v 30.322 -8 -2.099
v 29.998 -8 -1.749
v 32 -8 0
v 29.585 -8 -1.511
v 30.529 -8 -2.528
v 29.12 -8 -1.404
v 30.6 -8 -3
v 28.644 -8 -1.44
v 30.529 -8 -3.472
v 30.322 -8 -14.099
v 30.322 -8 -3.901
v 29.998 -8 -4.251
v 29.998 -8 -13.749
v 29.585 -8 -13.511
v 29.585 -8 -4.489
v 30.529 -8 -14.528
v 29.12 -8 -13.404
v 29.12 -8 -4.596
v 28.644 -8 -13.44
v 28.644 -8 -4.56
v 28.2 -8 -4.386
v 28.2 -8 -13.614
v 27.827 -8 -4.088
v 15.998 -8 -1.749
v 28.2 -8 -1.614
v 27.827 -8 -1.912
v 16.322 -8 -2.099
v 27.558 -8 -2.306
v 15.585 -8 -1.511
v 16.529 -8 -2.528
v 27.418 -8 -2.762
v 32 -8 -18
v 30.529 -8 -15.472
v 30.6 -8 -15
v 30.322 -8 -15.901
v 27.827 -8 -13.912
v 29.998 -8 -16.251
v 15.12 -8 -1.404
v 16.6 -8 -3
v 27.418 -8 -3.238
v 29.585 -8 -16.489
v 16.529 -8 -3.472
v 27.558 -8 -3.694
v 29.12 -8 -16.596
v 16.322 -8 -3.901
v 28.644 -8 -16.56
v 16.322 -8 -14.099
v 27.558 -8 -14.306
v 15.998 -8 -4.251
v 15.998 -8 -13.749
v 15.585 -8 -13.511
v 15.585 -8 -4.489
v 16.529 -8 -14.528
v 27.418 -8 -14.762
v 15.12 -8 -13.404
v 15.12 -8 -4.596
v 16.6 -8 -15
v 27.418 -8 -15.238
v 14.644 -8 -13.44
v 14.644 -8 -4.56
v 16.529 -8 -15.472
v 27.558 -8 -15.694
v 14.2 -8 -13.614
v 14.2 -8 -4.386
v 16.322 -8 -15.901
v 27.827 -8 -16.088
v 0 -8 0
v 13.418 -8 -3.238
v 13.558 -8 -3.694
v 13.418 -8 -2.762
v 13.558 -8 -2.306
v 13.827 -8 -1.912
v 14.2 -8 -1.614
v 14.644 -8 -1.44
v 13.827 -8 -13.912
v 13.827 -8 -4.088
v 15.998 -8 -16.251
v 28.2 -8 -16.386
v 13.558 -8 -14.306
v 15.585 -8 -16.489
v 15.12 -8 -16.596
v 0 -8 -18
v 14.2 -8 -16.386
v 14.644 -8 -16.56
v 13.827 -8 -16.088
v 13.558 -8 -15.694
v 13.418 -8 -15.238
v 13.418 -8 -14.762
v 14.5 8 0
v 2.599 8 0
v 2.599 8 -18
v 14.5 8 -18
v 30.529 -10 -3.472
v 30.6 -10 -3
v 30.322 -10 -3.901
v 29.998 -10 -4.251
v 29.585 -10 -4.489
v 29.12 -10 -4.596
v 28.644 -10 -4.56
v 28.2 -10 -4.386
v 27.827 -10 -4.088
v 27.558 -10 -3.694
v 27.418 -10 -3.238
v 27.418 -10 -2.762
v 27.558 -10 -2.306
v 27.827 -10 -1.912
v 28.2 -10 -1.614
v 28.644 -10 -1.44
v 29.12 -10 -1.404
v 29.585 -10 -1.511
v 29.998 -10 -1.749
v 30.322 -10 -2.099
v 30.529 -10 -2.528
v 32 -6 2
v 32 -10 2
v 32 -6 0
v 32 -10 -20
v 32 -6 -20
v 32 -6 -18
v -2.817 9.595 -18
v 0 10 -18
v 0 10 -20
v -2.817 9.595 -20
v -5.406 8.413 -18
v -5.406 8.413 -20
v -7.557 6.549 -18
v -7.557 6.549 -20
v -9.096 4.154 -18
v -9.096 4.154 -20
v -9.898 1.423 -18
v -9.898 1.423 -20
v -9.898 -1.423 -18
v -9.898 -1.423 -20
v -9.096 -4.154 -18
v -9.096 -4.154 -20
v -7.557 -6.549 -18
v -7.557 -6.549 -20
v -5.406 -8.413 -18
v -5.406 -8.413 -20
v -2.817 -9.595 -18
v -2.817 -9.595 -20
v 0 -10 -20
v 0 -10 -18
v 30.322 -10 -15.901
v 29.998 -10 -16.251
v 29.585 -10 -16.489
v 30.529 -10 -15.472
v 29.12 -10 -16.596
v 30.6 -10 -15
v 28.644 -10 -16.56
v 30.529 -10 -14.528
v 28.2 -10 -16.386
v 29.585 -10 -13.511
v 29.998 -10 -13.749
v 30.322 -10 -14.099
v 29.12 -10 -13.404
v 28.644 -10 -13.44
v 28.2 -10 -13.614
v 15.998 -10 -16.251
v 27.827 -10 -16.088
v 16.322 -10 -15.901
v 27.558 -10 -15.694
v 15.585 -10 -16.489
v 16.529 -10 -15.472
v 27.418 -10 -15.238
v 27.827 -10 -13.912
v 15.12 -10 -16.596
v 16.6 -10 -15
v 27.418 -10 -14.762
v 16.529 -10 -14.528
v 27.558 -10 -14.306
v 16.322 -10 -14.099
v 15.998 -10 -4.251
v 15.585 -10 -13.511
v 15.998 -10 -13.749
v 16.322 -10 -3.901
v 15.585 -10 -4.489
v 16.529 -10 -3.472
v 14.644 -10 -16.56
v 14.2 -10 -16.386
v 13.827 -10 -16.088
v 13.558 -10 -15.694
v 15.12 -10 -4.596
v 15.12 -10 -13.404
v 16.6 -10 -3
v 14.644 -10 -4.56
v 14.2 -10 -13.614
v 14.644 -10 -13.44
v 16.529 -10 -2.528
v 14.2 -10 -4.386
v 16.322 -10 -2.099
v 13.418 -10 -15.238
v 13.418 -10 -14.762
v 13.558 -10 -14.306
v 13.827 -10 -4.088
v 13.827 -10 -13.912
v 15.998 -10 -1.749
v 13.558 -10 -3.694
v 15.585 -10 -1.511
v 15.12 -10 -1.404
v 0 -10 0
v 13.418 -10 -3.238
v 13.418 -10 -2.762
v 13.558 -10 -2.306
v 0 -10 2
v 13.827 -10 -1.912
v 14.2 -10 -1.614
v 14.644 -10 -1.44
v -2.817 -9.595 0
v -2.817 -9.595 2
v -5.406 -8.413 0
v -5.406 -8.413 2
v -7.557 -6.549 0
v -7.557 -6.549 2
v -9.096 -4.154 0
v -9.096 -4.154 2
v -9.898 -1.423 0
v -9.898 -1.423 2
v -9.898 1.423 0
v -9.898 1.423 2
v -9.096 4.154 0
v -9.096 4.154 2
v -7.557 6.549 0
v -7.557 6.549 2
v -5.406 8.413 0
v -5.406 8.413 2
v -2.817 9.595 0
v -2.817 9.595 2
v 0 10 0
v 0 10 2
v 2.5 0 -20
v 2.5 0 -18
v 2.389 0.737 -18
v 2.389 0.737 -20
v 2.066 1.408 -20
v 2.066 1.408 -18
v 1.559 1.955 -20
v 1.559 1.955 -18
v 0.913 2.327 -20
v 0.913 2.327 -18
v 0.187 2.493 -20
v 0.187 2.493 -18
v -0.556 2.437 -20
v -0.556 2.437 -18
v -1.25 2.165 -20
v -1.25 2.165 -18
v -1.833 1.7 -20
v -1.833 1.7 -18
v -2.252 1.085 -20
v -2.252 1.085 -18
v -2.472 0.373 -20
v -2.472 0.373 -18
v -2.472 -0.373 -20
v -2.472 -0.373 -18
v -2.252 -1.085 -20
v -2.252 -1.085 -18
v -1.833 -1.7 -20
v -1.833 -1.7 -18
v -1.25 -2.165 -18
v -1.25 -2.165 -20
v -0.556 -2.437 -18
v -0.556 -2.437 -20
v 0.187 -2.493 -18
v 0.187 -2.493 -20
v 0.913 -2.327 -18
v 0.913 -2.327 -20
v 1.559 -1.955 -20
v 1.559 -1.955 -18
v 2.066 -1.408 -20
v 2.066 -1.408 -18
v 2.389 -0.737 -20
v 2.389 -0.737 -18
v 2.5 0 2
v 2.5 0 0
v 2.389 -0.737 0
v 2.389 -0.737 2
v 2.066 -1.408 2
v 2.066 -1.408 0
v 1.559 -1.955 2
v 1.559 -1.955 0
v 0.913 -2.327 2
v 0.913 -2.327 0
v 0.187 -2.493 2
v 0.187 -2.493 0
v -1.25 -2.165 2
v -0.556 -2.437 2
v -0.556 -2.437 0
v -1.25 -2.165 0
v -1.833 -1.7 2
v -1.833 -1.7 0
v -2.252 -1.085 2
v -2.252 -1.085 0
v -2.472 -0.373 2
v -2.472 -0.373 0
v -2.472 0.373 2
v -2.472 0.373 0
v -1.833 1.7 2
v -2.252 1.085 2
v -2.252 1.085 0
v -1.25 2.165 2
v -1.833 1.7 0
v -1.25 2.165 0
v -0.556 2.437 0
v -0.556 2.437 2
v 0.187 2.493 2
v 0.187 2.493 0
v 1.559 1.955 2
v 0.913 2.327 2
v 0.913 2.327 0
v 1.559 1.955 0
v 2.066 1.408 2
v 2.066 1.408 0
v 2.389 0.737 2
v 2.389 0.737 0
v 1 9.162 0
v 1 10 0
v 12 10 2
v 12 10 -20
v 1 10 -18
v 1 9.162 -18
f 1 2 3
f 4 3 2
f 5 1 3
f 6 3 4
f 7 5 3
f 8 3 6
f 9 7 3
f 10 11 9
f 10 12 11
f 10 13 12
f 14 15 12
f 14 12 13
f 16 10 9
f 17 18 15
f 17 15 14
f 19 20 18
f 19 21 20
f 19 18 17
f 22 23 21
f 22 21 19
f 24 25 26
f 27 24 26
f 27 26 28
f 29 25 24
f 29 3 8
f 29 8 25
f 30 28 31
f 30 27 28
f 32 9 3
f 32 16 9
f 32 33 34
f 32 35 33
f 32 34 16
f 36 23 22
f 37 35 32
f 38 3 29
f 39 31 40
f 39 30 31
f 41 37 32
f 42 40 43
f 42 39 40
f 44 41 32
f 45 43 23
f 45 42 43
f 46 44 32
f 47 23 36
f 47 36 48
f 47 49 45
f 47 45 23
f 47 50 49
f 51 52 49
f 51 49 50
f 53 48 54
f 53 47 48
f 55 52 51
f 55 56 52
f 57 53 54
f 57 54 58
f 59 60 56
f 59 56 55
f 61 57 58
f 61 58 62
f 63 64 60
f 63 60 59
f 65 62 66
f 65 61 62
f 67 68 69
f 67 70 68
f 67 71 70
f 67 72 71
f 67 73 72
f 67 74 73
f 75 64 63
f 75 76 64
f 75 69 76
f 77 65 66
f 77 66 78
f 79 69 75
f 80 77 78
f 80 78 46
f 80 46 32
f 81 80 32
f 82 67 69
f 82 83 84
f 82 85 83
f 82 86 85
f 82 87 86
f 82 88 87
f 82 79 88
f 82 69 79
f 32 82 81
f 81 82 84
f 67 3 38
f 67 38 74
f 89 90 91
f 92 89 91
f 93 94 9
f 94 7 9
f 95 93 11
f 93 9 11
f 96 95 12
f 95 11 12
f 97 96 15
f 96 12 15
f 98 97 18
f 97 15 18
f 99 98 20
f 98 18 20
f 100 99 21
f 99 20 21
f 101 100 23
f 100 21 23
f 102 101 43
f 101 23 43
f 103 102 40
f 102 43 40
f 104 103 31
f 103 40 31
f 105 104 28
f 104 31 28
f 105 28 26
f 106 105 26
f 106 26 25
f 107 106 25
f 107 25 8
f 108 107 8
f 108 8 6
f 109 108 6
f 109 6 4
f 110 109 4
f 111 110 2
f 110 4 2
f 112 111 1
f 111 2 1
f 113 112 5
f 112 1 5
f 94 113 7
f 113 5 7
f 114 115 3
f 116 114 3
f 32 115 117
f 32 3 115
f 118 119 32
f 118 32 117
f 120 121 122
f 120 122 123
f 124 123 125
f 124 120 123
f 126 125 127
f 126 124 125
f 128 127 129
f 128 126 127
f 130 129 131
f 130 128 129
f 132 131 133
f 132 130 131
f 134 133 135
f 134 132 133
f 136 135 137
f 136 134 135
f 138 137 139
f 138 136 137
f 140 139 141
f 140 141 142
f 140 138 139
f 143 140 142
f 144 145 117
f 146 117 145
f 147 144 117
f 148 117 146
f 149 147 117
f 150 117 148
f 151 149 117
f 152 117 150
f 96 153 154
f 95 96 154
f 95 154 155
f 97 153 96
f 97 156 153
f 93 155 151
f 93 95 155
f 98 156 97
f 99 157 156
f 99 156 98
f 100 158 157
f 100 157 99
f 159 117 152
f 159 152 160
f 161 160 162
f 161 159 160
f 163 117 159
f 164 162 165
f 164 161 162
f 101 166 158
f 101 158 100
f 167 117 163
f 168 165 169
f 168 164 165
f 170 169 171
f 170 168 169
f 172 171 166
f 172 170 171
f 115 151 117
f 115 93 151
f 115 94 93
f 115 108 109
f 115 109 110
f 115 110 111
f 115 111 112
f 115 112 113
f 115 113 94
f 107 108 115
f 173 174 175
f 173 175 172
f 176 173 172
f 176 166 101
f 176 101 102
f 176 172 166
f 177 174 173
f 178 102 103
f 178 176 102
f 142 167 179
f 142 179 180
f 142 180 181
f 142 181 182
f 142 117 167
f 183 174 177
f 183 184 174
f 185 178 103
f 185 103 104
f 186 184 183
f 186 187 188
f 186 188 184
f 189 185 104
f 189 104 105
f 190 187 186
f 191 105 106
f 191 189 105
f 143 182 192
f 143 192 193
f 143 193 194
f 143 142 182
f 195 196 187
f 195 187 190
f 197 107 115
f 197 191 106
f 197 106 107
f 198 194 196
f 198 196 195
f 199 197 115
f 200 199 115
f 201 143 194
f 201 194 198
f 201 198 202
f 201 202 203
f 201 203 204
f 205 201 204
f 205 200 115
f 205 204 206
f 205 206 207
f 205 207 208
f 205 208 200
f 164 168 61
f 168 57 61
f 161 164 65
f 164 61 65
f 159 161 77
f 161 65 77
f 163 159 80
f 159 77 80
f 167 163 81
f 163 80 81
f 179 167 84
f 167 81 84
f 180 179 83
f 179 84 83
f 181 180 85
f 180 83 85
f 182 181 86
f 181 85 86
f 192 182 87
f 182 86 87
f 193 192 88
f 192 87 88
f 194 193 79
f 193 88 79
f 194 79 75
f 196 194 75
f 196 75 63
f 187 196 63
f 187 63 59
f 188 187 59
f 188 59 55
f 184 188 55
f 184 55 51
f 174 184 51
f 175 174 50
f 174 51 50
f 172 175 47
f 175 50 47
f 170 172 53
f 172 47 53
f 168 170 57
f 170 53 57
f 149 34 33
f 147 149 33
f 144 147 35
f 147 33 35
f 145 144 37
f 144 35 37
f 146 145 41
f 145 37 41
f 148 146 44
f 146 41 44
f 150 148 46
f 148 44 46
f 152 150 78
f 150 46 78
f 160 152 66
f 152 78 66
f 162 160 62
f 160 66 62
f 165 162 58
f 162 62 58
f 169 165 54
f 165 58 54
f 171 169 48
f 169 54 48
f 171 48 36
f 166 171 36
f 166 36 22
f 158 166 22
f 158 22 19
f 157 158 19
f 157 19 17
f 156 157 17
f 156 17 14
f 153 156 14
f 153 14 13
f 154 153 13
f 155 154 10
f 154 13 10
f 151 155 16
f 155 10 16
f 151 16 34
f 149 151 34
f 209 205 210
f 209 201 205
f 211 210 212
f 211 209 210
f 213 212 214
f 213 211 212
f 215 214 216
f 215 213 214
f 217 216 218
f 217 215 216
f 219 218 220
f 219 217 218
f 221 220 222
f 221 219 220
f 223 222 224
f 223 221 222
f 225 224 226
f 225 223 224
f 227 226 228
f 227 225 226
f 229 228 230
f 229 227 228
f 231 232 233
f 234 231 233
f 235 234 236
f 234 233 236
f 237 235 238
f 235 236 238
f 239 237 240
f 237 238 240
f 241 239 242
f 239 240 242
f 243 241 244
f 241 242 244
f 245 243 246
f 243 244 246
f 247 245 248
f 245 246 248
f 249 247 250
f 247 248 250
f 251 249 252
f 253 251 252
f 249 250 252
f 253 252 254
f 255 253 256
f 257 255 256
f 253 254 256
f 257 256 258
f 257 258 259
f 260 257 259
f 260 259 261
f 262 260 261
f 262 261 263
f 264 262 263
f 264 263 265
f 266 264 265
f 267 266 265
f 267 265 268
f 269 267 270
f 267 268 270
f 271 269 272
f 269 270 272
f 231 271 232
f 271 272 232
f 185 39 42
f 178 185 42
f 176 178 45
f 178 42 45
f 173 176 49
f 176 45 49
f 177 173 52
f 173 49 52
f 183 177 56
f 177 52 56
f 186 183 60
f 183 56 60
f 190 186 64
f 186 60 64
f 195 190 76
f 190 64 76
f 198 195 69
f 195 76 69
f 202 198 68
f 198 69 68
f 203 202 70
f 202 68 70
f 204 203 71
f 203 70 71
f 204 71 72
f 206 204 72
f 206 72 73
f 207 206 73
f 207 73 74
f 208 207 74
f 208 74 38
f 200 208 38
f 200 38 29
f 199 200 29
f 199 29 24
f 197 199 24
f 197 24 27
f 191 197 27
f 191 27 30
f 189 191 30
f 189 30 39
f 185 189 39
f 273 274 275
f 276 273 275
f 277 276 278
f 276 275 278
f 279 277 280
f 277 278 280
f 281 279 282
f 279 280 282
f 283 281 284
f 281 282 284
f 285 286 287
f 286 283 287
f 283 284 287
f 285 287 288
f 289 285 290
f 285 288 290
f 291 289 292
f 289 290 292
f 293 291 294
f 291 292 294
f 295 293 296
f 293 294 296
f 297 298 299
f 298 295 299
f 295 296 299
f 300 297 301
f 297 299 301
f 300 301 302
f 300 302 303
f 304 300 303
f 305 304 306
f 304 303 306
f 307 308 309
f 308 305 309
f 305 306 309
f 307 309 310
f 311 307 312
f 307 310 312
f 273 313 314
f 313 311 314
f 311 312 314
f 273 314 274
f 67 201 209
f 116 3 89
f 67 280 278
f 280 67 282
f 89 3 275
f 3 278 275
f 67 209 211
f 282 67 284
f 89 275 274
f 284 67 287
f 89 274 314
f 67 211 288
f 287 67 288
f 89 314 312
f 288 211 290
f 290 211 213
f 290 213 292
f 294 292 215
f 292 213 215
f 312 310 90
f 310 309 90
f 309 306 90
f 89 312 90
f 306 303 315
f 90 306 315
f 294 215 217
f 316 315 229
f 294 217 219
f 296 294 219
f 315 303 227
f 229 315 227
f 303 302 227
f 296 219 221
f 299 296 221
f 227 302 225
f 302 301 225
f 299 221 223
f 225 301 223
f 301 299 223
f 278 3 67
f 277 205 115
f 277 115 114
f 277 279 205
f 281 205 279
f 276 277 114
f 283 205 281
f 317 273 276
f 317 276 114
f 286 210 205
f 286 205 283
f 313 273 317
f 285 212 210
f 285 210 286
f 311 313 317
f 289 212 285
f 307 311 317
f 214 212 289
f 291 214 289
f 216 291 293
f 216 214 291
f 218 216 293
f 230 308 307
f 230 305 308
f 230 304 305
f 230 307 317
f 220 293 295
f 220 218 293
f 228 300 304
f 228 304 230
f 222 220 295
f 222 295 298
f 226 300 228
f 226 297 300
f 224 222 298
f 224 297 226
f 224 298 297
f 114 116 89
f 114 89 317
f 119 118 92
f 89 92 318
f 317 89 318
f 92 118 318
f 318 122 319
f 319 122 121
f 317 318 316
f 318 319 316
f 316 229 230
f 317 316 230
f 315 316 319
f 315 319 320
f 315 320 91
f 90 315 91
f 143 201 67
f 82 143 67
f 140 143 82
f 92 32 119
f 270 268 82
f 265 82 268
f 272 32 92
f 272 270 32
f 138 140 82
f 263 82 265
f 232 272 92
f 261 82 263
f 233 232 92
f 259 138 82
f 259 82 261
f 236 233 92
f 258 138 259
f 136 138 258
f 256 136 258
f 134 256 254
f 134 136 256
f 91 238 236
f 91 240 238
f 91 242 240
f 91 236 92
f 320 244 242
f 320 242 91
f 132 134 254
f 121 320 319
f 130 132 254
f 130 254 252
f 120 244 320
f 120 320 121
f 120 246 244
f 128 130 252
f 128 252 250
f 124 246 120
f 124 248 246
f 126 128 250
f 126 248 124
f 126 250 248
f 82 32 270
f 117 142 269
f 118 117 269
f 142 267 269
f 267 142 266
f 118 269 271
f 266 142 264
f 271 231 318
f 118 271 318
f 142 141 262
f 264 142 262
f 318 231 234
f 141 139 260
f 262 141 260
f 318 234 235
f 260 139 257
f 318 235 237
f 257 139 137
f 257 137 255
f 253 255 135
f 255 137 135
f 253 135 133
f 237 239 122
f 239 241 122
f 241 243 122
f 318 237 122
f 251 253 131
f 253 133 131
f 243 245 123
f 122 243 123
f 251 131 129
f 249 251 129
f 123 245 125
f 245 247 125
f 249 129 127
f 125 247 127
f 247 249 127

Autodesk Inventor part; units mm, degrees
ref_plane "YZ Plane" through (0, 0, 0) normal (1, 0, 0) x (0, 1, 0)
ref_plane "XZ Plane" through (0, 0, 0) normal (0, 1, 0) x (-1, 0, 0)
sketch "Sketch1" plane through (0, 0, 0) normal (0, 0, 1) x (1, 0, 0)
  circle A0 centre (0, 0) radius 2.5
  arc A1 (0, 10) -> (0, -10) centre (0, 0) ccw
  line L0 (0, 10) -> (12, 10)
  line L1 (0, -10) -> (12, -10)
  line L2 (12, -10) -> (12, 10)
  dimension "d0" = 5
  dimension "d1" = 20
  dimension "d2" = 12
extrude "Extrusion1" add sketch "Sketch1" along normal blind 2
sketch "Sketch5" plane through (0, 0, 0) normal (0, 0, -1) x (-1, 0, 0)
  circle A0 centre (0, 0) radius 2.5 projected
  line L0 (-12, -10) -> (0, -10)
  line L1 (0, -10) -> (0, -8)
  line L2 (0, -8) -> (-12, -8)
  line L3 (-12, -8) -> (-12, -10)
  line L4 (-12, 10) -> (-1, 10)
  line L5 (-1, 10) -> (-1, 8)
  line L6 (-1, 8) -> (-12, 8)
  line L7 (-12, 8) -> (-12, 10)
  dimension "d21" = 2
  dimension "d22" = 2
  dimension "d24" = 1
extrude "Extrusion5" add sketch "Sketch5" along normal blind 2 contours L3 L2 L1 L0 | L4 L5 L6 L7
sketch "Sketch6" plane through (0, 0, -2) normal (0, 0, -1) x (-1, 0, 0)
  line L0 (-12, 8) -> (-1, 8) projected
  line L1 (-1, 8) -> (-1, 10) projected
  line L2 (-1, 9.162) -> (-2.5994, 8)
  line L3 (-2.5994, 8) -> (6.8052, -4.9443) construction
  line L4 (6.8052, -4.9443) -> (8.4046, -3.7823) construction
  line L5 (8.4046, -3.7823) -> (-1, 9.162) construction
  line L6 (-2.5994, 8) -> (-1, 8)
  line L7 (-1, 9.162) -> (-1, 8)
  point P0 (0, 0)
  dimension "d27" = 16
  dimension "d28" = 8
  dimension "d29" = 36
extrude "Extrusion6" cut sketch "Sketch6" against normal blind 2
ref_plane "Work Plane1" through (0, 0, -9) normal (0, 0, -1) x (-1, 0, 0)
mirror "Mirror1" about plane through (0, 0, -9) normal (0, 0, -1)
sketch "Sketch7" plane through (0, -10, -16) normal (0, 0, 1) x (1, 0, 0)
  line L0 (12, 0) -> (0, 0) projected
  line L1 (12, 2) -> (12, 0) projected
  line L2 (0, 2) -> (12, 2) projected
  line L3 (0, 0) -> (0, 2) projected
  line L4 (2.5994, 18) -> (1, 19.162) projected
  line L5 (12, 18) -> (2.5994, 18) projected
  line L6 (12, 20) -> (12, 18) projected
  line L7 (1, 20) -> (12, 20) projected
  line L8 (1, 19.162) -> (1, 20) projected
  point P0 (0, 10)
extrude "Extrusion7" add sketch "Sketch7" along normal blind 14
sketch "Sketch8" plane through (12, -10, 2) normal (1, 0, 0) x (0, 0, -1)
  line L0 (22, 20) -> (0, 20) projected
  line L1 (0, 0) -> (0, 20) projected
  line L2 (22, 0) -> (0, 0) projected
  line L3 (22, 0) -> (22, 20) projected
  line L4 (2, 18) -> (20, 18) projected
  line L5 (20, 2) -> (20, 18) projected
  line L6 (2, 2) -> (20, 2) projected
  line L7 (2, 2) -> (2, 18) projected
  point P0 (2, 10)
extrude "Extrusion8" add sketch "Sketch8" along normal blind 20
sketch "Sketch9" plane through (0, 0, -20) normal (0, 0, -1) x (-1, 0, 0)
  line L0 (-32, 10) -> (0, 10) projected
  line L1 (-32, -10) -> (-32, 10) projected
  line L2 (-32, -6) -> (-12, 10)
  dimension "d37" = 20
  dimension "d38" = 4
extrude "Extrusion9" cut sketch "Sketch9" against normal blind 22
sketch "Sketch10" plane through (0, -8, 0) normal (0, 1, 0) x (1, 0, 0)
  line L0 (32, 0) -> (0, 0) projected
  line L1 (32, 18) -> (32, 0) projected
  line L2 (0, 18) -> (32, 18) projected
  line L3 (15, 15) -> (29, 15) construction
  line L4 (29, 15) -> (29, 3) construction
  line L5 (29, 3) -> (15, 3) construction
  line L6 (15, 3) -> (15, 15) construction
  circle A0 centre (15, 3) radius 1.6
  circle A1 centre (29, 3) radius 1.6
  circle A2 centre (29, 15) radius 1.6
  circle A3 centre (15, 15) radius 1.6
  dimension "d41" = 3.2
  dimension "d42" = 3
  dimension "d43" = 3
  dimension "d44" = 3
  dimension "d45" = 14
extrude "Extrusion10" cut sketch "Sketch10" against normal through all
properties part number "x_axis_cable_mount_a" material "ABS Plastic"
